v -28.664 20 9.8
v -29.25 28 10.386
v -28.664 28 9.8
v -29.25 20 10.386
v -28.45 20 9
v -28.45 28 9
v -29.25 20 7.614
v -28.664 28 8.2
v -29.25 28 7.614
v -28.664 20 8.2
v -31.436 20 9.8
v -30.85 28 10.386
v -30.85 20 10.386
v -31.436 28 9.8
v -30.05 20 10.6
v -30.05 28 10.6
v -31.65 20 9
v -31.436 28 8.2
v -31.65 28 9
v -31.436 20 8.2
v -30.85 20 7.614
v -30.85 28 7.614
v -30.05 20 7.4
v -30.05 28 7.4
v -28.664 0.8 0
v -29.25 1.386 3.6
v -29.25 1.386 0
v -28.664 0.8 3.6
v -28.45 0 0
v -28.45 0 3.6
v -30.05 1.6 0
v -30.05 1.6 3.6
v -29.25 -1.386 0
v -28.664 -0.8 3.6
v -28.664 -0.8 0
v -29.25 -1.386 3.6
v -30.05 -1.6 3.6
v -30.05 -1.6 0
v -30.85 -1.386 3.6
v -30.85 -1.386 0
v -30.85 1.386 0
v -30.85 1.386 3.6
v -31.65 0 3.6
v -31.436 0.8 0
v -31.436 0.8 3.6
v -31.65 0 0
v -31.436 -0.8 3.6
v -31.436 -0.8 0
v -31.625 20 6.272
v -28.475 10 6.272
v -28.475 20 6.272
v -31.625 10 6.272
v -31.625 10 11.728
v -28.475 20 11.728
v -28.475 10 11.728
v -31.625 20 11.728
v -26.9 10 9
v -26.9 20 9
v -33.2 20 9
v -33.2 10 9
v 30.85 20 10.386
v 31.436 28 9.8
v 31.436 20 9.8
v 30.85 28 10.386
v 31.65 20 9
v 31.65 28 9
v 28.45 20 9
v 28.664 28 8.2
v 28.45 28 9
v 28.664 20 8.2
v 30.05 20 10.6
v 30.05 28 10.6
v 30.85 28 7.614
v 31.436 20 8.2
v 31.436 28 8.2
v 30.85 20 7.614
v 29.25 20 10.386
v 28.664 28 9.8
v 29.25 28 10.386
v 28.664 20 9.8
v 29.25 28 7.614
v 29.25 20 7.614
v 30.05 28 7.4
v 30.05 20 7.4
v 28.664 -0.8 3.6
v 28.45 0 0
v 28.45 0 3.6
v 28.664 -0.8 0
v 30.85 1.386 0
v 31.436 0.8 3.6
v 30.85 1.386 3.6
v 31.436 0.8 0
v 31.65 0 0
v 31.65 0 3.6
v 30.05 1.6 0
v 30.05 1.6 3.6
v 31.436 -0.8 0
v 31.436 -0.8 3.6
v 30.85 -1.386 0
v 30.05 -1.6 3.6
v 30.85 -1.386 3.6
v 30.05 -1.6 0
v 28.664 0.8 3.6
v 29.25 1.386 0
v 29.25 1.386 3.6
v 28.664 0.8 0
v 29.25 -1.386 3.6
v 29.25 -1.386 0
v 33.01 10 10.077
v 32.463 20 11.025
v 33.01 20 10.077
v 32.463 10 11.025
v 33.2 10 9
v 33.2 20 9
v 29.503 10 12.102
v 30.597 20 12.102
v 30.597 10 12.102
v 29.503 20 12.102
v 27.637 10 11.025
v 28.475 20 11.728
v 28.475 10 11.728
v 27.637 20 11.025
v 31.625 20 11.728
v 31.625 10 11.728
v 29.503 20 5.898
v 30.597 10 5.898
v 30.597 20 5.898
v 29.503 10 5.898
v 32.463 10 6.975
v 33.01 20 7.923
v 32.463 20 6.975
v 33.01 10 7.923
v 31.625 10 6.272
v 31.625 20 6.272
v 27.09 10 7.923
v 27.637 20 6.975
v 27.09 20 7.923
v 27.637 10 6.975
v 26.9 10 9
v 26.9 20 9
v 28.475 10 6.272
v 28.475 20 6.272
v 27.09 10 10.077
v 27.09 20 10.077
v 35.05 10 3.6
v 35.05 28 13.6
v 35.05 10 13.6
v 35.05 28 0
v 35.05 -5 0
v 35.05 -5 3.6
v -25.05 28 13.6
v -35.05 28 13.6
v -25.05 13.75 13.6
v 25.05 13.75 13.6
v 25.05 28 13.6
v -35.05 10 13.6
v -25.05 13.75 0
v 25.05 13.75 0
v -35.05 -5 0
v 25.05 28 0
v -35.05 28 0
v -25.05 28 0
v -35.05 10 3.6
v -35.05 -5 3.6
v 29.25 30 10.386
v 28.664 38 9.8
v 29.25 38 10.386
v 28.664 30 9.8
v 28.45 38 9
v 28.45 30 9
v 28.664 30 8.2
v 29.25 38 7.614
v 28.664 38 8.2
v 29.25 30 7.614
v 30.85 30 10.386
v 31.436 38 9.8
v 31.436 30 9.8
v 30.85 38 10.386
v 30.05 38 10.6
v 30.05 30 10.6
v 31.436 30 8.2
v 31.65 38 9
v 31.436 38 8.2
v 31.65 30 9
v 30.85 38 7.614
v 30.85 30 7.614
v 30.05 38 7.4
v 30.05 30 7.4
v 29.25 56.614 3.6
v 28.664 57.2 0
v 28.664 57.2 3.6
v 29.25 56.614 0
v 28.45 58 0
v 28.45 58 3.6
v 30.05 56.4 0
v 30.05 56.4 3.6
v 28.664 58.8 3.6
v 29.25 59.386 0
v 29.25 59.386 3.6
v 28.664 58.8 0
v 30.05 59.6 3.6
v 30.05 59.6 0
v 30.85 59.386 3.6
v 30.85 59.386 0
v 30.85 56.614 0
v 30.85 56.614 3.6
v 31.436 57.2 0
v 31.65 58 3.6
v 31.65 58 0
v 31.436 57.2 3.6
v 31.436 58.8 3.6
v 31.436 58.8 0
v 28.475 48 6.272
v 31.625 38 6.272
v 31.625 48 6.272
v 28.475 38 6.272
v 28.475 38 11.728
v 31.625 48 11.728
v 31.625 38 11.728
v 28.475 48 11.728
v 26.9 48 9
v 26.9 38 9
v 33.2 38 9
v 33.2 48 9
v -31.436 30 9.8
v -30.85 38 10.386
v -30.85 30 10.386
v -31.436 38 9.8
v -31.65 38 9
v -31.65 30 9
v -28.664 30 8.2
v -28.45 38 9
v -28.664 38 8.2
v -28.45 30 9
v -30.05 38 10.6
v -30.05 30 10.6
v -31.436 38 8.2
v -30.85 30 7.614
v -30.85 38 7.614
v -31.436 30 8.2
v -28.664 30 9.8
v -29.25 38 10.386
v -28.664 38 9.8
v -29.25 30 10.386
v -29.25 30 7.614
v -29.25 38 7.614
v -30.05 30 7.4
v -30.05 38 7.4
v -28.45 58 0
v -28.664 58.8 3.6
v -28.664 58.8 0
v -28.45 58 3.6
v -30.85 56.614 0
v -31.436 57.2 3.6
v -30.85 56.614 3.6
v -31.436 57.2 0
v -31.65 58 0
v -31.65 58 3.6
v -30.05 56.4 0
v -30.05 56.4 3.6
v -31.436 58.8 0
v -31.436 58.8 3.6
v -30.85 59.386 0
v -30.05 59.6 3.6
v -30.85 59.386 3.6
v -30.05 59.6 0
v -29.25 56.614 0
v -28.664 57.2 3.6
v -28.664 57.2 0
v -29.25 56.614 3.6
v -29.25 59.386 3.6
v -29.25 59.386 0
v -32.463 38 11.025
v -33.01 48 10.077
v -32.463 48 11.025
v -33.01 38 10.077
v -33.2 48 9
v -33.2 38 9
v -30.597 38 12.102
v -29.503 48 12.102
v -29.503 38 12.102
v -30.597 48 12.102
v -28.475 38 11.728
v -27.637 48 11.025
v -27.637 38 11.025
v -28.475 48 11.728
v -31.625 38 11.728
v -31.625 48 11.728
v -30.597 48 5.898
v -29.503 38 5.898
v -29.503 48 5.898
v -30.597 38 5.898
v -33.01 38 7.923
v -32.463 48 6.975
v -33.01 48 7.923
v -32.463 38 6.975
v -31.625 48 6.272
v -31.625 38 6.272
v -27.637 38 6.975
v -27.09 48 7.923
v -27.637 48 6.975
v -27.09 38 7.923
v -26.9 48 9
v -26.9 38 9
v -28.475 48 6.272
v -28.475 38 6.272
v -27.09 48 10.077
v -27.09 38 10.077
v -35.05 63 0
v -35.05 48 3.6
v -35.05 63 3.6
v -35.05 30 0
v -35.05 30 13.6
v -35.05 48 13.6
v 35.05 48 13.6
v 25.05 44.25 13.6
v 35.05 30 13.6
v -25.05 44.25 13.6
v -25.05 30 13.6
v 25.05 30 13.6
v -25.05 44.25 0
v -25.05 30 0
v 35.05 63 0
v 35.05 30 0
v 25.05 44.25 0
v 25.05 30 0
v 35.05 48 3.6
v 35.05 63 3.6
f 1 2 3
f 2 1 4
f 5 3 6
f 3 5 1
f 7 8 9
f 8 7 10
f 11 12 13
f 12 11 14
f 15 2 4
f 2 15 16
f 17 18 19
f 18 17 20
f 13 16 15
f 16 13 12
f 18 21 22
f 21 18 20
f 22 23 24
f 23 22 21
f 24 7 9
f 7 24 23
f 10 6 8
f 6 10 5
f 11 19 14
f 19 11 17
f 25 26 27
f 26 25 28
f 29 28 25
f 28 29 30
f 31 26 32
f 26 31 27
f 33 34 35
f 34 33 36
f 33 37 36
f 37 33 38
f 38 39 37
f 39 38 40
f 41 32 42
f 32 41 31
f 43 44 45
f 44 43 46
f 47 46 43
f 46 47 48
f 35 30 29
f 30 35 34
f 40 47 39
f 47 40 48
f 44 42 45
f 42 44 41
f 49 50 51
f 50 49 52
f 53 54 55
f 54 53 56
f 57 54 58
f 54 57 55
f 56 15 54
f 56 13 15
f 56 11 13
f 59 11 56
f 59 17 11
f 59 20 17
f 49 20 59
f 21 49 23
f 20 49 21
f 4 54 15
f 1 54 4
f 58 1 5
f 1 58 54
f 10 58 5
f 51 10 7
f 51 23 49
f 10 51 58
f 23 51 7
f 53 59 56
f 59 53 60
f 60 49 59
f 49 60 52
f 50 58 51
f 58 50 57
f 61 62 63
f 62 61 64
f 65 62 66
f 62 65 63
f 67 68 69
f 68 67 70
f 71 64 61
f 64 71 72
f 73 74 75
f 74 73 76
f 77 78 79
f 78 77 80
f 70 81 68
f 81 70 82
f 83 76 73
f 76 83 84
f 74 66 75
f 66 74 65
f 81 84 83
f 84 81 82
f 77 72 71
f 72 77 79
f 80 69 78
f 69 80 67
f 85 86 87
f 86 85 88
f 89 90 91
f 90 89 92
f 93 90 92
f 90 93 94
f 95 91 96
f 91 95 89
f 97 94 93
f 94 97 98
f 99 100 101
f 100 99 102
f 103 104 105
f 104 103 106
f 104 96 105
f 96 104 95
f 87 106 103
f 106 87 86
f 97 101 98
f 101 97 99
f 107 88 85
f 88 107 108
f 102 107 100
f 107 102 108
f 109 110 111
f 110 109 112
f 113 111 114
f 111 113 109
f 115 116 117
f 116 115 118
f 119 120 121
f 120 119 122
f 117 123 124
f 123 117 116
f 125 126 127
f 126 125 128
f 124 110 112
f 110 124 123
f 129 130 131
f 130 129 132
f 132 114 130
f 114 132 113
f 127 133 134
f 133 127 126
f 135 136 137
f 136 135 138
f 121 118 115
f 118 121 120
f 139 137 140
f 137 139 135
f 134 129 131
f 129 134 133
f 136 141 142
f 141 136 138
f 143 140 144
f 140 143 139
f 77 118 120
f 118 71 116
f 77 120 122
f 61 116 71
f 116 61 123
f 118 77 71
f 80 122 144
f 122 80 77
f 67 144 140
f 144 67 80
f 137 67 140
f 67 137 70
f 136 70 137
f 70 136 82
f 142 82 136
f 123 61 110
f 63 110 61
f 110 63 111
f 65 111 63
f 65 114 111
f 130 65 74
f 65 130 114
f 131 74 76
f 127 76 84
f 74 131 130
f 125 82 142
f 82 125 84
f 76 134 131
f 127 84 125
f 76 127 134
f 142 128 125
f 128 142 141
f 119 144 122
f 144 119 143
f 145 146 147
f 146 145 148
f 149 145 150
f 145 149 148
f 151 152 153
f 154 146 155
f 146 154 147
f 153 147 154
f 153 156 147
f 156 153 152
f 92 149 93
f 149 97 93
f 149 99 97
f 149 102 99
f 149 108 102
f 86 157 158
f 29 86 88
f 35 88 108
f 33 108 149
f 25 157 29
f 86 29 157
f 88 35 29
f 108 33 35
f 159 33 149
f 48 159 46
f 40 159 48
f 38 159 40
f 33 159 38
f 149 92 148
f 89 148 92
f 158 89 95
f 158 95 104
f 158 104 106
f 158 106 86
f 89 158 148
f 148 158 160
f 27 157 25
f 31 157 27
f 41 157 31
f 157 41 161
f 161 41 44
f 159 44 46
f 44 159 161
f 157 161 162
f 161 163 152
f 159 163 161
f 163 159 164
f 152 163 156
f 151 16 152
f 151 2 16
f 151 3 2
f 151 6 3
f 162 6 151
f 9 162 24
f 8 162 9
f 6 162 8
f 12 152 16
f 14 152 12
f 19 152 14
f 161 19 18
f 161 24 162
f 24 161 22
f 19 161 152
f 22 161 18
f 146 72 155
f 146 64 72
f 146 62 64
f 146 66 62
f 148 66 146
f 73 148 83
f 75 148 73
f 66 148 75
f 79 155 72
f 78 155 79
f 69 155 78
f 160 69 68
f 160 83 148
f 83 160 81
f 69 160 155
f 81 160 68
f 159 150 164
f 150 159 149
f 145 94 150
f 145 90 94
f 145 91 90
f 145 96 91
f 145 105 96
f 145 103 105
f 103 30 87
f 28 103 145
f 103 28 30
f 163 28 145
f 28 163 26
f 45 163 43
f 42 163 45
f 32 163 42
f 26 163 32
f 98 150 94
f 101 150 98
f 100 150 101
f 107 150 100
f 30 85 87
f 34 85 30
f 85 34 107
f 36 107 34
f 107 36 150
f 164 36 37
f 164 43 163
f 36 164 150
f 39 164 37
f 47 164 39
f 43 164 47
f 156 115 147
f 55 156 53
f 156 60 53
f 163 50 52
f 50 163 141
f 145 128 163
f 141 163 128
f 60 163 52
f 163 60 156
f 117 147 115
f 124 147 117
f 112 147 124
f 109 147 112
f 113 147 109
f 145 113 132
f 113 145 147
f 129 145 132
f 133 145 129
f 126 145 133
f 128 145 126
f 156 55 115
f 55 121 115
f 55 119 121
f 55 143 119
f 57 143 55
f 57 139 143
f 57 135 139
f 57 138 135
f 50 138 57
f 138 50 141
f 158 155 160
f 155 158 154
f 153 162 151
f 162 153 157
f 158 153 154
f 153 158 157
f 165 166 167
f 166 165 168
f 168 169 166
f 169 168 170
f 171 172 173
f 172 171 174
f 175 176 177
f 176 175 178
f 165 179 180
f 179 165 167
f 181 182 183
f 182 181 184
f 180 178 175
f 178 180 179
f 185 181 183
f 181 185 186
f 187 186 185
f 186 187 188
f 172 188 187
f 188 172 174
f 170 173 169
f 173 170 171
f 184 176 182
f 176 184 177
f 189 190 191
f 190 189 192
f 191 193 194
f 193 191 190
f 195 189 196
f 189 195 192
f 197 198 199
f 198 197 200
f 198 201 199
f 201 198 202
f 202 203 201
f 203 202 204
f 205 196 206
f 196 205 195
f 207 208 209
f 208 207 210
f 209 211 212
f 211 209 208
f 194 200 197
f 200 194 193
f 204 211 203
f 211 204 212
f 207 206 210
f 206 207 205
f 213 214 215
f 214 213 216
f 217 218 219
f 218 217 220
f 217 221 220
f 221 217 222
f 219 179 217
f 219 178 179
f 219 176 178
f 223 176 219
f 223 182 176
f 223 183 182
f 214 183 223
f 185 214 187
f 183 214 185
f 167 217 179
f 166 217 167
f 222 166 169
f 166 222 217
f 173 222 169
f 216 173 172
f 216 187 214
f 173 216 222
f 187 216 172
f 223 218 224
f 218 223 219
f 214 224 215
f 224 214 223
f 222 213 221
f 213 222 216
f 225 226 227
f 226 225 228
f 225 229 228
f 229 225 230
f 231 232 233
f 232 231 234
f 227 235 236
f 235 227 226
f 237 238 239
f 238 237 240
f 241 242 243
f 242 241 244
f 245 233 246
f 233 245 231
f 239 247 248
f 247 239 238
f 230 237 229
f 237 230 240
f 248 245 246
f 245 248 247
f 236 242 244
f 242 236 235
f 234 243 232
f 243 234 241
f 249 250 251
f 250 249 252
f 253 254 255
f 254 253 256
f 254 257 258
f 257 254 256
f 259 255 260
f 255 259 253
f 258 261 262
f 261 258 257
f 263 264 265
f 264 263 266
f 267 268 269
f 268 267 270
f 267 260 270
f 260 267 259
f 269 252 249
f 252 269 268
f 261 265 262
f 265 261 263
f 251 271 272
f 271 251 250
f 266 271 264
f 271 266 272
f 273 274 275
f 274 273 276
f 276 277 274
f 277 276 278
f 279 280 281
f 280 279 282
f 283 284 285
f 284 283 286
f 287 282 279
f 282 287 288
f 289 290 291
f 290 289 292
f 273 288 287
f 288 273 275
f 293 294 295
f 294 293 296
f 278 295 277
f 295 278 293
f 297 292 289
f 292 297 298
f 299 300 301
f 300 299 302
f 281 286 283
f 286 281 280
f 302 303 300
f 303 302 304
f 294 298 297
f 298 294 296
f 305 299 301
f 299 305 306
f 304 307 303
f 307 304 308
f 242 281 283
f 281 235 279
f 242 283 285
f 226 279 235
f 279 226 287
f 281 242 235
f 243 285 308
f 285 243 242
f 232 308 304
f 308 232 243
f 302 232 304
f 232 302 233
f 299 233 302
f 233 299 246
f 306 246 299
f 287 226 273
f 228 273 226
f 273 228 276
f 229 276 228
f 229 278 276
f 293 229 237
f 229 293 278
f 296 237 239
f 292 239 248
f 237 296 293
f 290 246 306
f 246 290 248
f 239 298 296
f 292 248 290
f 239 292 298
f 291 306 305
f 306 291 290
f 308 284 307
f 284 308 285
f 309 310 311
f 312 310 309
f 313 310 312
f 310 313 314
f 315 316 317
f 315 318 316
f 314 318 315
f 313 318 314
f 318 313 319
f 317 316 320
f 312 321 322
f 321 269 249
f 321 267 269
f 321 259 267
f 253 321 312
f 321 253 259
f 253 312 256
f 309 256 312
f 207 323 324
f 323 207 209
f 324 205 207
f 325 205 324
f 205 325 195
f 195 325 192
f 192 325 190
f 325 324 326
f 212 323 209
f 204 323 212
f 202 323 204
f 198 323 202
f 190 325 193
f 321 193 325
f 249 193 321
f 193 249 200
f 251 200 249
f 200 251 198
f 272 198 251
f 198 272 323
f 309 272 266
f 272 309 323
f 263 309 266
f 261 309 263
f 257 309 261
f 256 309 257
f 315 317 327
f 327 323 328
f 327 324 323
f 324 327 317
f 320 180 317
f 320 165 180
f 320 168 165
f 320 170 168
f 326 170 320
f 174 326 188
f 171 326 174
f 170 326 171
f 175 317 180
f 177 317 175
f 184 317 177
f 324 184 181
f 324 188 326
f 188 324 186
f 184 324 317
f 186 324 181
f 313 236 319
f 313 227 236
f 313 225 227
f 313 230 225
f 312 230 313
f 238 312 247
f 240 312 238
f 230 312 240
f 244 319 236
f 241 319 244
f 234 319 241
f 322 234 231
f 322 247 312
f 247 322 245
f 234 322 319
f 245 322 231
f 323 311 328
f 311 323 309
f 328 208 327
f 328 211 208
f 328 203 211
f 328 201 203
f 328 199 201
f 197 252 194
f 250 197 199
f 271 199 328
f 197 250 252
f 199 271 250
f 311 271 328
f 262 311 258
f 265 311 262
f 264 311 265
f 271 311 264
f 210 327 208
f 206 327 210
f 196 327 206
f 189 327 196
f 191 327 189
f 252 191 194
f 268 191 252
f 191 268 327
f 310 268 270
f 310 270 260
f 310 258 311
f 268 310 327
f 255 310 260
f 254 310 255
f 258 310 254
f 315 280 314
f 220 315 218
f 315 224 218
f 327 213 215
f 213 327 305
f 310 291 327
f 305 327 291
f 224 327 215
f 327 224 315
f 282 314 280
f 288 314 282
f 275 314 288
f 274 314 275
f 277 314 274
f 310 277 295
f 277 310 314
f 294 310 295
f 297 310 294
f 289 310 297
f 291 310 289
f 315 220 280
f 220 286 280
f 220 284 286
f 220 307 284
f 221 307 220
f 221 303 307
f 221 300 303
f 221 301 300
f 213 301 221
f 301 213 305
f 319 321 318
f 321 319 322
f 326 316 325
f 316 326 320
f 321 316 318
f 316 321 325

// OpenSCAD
// file: configuration.scad
// OD = outside diameter, corner to corner.
m3_nut_od = 6.1;
m3_nut_radius = (m3_nut_od+0.2)/2;

// Major diameter of metric 3mm thread.
m3_major = 2.85;
m3_radius = m3_major/2;
m3_wide_radius = 3.2/2;

// NEMA17 stepper motors.
motor_shaft_diameter = 5;
motor_shaft_radius = (motor_shaft_diameter+0.3)/2;

// Frame brackets.
thickness = 3.6;
// main file
include <configuration.scad>;

space = 43;  // Between horizontal OpenBeam pieces.
bracket_height = 12.5 + space/2 - 1;
power_supply_height = 30.5;
power_supply_width = 50.1;

module frame_power_supply() {
  difference() {
    translate([0, bracket_height/2-5, (10+thickness)/2])
      cube([power_supply_width+20, bracket_height, 10+thickness],
	   center=true);
    translate([0, 0, 10+thickness])
      cube([power_supply_width+30, 20, 20],
	   center=true);
    translate([0, 7.5+space/2, 0]) #
      cube([power_supply_width, power_supply_height, 100], center=true);
    for (x = [-1, 1]) {
      translate([x*(power_supply_width/2+5), 20, 9]) rotate([90, 0, 0])
	cylinder(r=m3_wide_radius, h=40, center=true, $fn=12);
      translate([x*(power_supply_width/2+5), 0, 9])
	cylinder(r=m3_wide_radius, h=40, center=true, $fn=12);
      translate([x*(power_supply_width/2+5), 20, 9]) rotate([90, 0, 0])
	cylinder(r=m3_nut_radius, h=40, $fn=12+x*6);
    }
  }
}

translate([0, space+15, 0]) rotate([0, 0, 180]) frame_power_supply();
frame_power_supply();
